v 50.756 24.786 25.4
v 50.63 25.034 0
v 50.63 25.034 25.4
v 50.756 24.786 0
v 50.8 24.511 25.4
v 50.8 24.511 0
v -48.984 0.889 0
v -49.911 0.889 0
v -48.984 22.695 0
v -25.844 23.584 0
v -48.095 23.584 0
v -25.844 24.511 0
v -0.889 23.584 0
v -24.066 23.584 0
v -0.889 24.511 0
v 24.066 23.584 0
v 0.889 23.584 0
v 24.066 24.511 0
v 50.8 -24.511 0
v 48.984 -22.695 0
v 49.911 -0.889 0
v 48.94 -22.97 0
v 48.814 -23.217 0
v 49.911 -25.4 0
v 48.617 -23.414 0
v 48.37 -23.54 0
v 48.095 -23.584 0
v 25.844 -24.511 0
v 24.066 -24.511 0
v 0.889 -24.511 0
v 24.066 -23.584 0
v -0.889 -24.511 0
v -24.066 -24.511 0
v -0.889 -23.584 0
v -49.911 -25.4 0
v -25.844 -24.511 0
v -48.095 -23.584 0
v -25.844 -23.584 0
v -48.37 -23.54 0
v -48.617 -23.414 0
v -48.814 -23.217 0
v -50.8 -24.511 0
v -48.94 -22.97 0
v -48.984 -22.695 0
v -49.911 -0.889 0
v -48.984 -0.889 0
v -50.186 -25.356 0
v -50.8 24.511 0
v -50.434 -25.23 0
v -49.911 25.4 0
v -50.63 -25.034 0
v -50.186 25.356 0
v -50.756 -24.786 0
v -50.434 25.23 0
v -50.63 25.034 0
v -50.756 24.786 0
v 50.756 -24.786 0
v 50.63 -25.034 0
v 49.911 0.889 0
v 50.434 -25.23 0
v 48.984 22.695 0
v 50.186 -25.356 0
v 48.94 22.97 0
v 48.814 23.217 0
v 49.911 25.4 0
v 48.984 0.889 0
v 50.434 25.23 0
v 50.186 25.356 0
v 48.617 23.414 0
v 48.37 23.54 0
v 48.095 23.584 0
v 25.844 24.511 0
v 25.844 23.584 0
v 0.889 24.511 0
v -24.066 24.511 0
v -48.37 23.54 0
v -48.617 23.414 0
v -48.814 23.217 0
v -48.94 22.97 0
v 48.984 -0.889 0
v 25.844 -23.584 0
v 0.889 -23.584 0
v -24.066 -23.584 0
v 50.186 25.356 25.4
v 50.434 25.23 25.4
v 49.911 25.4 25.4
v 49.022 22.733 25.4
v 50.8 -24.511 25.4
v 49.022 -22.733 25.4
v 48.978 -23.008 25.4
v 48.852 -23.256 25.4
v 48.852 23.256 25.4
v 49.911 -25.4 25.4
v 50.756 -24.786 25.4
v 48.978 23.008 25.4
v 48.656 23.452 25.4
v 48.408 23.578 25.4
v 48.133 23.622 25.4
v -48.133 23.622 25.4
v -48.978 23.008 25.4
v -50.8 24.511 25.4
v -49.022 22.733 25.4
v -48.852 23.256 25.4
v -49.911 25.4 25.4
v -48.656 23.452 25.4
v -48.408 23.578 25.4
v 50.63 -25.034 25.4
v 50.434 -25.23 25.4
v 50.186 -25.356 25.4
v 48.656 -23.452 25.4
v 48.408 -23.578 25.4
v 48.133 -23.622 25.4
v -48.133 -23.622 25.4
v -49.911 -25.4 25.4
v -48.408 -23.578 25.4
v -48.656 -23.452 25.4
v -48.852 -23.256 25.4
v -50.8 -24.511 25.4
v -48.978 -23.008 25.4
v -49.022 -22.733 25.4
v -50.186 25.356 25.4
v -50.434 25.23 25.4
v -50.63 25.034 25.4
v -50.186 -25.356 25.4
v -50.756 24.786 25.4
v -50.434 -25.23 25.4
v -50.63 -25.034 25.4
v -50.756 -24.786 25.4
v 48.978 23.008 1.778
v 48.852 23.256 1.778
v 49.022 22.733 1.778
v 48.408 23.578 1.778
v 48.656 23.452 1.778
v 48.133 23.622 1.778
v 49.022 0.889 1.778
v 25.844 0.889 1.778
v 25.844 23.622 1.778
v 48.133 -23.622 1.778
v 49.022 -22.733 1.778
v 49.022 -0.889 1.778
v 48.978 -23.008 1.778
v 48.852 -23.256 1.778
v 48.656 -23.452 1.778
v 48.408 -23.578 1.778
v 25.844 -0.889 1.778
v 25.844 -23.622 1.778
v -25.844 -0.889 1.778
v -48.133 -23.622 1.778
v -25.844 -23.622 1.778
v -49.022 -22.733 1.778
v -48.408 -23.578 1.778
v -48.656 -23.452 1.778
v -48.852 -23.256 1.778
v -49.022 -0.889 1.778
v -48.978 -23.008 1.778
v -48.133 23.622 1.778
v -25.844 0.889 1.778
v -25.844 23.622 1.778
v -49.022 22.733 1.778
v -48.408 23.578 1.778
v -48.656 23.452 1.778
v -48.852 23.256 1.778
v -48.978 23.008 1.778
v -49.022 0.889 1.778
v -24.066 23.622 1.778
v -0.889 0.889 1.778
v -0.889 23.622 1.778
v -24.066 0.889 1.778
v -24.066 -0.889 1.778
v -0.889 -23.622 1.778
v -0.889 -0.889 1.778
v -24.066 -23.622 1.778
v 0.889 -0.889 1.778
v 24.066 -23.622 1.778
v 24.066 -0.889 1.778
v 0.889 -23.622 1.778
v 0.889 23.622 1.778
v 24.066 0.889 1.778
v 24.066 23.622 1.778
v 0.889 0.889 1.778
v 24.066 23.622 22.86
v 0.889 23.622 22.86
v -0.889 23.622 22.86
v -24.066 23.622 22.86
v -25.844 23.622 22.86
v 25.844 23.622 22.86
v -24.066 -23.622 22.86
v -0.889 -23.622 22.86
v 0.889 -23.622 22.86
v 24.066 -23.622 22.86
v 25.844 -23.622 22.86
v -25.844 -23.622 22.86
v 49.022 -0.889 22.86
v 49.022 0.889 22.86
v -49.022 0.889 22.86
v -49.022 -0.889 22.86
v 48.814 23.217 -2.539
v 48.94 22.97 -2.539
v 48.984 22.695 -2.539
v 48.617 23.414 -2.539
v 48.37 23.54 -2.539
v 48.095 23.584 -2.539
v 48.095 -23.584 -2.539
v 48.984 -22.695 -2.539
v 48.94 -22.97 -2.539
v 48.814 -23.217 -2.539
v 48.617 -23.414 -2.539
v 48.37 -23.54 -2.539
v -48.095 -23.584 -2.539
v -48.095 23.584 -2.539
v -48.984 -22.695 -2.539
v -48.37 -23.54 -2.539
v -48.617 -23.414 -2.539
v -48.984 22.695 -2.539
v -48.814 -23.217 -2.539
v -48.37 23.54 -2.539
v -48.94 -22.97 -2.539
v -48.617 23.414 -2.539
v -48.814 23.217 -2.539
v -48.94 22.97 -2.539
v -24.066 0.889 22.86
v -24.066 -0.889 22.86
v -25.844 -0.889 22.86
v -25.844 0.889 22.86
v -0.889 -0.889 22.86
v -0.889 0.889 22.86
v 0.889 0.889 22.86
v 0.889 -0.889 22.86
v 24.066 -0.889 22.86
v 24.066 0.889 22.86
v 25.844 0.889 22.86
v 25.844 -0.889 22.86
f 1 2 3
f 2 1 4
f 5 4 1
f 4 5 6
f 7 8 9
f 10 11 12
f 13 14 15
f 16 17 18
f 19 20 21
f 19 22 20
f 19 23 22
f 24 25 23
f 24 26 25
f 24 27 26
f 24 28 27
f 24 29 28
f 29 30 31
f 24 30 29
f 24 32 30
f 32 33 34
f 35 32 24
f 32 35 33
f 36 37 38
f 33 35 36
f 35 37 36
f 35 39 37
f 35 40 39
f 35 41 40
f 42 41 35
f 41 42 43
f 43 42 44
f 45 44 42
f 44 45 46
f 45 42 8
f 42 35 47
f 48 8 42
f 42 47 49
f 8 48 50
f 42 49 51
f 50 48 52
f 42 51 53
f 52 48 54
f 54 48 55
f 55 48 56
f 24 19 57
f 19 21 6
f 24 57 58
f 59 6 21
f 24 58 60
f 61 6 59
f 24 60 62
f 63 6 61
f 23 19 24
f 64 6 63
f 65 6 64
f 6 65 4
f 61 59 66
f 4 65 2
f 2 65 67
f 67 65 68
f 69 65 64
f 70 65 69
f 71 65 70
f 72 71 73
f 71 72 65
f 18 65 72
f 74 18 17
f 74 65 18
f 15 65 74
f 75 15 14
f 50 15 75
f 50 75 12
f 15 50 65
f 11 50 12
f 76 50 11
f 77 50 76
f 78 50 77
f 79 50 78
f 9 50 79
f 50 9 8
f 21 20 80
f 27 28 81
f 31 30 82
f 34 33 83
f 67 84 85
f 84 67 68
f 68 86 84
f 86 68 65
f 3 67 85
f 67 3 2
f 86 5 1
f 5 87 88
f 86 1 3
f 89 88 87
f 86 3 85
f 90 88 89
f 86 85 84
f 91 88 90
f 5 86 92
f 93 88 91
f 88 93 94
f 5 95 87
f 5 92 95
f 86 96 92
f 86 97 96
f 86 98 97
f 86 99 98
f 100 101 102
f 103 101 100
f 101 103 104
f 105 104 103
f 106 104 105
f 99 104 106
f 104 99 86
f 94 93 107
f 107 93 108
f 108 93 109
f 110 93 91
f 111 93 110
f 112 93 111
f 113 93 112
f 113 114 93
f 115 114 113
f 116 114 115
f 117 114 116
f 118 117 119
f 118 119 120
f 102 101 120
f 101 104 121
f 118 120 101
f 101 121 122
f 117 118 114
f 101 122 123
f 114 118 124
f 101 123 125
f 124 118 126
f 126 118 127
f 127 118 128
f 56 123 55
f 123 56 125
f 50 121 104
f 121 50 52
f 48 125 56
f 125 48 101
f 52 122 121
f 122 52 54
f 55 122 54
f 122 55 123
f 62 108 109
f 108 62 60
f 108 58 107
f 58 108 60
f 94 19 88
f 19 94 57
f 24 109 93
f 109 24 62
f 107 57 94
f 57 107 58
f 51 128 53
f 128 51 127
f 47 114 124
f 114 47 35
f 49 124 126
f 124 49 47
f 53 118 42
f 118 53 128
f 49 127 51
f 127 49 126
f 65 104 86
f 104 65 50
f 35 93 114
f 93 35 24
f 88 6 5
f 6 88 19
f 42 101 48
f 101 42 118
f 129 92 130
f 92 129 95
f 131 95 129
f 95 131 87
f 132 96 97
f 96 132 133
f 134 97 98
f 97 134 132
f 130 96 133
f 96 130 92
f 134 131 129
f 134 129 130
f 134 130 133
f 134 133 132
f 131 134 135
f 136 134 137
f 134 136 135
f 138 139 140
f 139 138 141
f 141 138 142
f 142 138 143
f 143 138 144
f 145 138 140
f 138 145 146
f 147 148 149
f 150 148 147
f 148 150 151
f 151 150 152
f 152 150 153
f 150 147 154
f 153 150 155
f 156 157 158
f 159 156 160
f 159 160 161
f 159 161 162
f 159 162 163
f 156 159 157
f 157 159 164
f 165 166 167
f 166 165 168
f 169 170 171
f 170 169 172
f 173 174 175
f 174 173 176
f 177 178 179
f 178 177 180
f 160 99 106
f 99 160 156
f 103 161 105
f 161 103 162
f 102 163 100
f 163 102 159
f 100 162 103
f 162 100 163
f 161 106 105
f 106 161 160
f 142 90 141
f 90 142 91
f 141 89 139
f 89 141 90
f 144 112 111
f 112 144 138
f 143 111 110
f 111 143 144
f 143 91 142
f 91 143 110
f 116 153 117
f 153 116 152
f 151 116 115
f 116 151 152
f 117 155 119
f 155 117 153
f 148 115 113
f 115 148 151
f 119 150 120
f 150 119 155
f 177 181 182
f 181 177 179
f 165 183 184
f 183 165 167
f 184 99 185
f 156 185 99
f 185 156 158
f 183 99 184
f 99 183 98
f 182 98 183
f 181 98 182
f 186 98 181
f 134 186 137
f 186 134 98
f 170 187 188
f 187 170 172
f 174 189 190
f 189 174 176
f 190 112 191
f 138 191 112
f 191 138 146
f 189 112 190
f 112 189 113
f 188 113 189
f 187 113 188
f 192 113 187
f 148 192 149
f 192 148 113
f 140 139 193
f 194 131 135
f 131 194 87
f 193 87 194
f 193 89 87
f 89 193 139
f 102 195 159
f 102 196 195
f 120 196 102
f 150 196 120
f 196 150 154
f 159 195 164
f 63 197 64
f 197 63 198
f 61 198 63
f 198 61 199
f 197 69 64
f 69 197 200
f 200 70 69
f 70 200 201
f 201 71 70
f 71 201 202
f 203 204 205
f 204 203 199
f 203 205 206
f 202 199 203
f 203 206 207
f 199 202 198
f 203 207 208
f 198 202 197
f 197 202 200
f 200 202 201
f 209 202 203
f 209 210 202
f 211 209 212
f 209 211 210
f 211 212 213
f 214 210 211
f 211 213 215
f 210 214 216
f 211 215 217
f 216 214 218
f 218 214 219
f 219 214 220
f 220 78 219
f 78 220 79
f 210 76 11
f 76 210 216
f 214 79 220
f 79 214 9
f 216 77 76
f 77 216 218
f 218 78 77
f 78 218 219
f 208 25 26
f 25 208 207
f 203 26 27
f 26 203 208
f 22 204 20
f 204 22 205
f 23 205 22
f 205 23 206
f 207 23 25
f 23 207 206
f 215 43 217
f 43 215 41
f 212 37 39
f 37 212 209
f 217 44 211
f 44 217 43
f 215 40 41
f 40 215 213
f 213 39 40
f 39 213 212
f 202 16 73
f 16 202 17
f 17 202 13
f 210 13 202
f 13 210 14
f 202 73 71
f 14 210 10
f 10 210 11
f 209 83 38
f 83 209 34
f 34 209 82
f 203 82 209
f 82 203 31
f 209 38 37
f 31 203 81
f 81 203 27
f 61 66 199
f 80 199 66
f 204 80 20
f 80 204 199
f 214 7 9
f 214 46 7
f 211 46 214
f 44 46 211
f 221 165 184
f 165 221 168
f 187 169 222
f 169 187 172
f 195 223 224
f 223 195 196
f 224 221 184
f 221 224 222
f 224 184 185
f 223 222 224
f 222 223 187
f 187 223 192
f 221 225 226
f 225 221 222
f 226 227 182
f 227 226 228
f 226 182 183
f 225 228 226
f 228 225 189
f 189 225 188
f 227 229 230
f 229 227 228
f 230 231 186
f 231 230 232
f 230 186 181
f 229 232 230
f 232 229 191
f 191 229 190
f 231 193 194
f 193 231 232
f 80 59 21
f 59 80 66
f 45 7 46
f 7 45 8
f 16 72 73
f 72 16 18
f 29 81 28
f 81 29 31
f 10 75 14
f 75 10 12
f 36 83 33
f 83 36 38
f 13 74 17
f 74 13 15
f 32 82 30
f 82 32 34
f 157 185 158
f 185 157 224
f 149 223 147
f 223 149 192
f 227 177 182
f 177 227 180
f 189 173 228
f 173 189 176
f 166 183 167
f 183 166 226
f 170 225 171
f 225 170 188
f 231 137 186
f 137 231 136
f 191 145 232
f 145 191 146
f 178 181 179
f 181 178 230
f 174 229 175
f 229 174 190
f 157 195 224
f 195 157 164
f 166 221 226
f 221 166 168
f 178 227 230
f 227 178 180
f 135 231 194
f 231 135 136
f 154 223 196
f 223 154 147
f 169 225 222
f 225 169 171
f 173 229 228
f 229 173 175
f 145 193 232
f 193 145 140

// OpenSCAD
// Specifies the measurement system and scale you want to use for your trays.  All dimensions below will be in these units.  There are presets called "imperal defaults" and "metric defaults" that make good starting points. 
Scale_Units = 25.4; // [25.4:inch, 10.0:cm]

// Specifies the external tray length in the select unit scale
Tray_Length = 4.0; // [1.0:1.0:10.0]

// Specifies the external tray width in the select unit scale
Tray_Width = 2.0; // [1.0:1.0:10]

// Specifies the external tray height in the select unit scale.  Stackable trays (Interlock Height > 0) will increase the actual height by the height of the interlocking extrusion.
Tray_Height = 1.0; // [0.0:0.25:8]

// Create a lid for your tray.  (See Lid and Interlock Parameters).
Create_A_Lid = false;

// Select a build mode, then use the controls in the same named tabs to specify generation parameters
Build_Mode = "Square_Cups"; // ["Just_the_Tray", "Square_Cups", "Length_Width_Cups", "Length_Width_Cup_Ratios", "Custom_Divisions_per_Column_or_Row", "Custom_Ratio_Divisions", "Tray_Lid"]

/* [Tray Insert Parameters] */

// Size this tray to fit into a bigger tray.  Tray Length and Width is the size of the tray it will fit into. This tray will be just small enough to rest inside the outer tray. The outer tray should have division walls for the insertr tray to rest on, that are sized down appropriately. See "Insert Tray Heighth". Using this will force the Interlock Height to 0
Make_Insert_Tray = false;

// Use this to adapt a larger tray to accespt an smaller insert tray. Set this to be the same height as the height of the insert tray. 
Insert_Tray_Height = 0.0;  // [0.00:0.05:2.00]

// Use this to specify how much free space is between the inner wall of the outer tray and the outer wall of the inner tray. Larger values will create a looser fit.
Insert_Tray_Gap = 0.03;  // [0.00:0.005:2.00]


/* [Square Cups] */
// If not 0, specifies the size of square cups to be create, both tray_length and tray_width should be a multiple of this value.  If your tray is 8x4 and you use a cup size of 1 you will get 32 cups. 
Square_Cup_Size = 1; //[1.0:0.5:10]

/* [Length/Width Cups] */
// This create the specified number of equal length cups along the length of the tray.
Cups_Along_Length = 1; //[1.0:1.0:10]

// This create the specified number of equal width cups across the width of the tray.
Cups_Across_Width = 1; //[1.0:1.0:10]

/* [Length/Width Cup Ratios] */
// This creates cup dividers at the given ratios.  For instance [1,1] makes two equal length divisions, and [1,1,2] makes 2 equal length small divisions and one division that is twice as long.
Lengthwise_Cup_Ratios = [1,1,1,1,1];

// This creates cup dividers at the given ratios.  For instance [1,1] makes two equal width divisions, and [1,1,2] makes 2 equal width small divisions and one divisions that is twice as wide.
Widthwise_Cup_Ratios = [1,1,1,1,1];

/* [Custom Divisions per Column or Row] */
// It is strongly advised that you build this expression in a real text editor, then paste it here.
Custom_Col_Row_Ratios = [1,5,2,2,2,1.5,2,0,3,0,3,0,3,0,2,0,5];

// M2-M3: ["|", 5, 2.5, 2, 3, 3, 3, "*", 3, "*", 3, "*", 3, "*", 2, "*", 5]
// M4:    ["|", 5, 2.5, 2, 3, 3, 3, "*", 4, "*", 4, "*", 3, "*", 2, "*", 5]

/* [Custom Ratio Divisions] */
// It is strongly advised that you build this expression in a real text editor, then paste it here.
Custom_Division_List = [ "-", 0.333, 0.0, 0.666, "-", 0.666, 0.333, 1.0, "|", 0.333, 0.333, 1.0, "|", 0.666, 0.0, 0.666 ];
//[[ "-", 0.66, [0.0, 0.66]],[ "|", 0.66, [0.66, 1.0]]];

/* [Wall Parameters] */
// Specifies how thick the outer wall of the tray will be
Tray_Wall_Thickness = 0.07; // [0.05:0.01:0.50]

// Specifies how thick the floor will be.
Floor_Thickness = 0.07; // [0.05:0.01:0.50]

// Specifies how thick each internal cup divider will be.
Divider_Wall_Thickness = 0.07; // [0.05:0.01:0.50]

// Specifies the "roundess" of tray corners Set to 0 for square corners. Set to 1.0 for the most rounding.  This is a ratio of the wall thickness.
Corner_Roundness = 0.5; // [0.00:0.01:1.00]

/* [Lid Parameters] */
Lid_Handle_Style = "Finger_Holes"; // ["No_Handle", "Finger_Holes", "Block_Handle", "Bar_Handle"]

// How thick should the lid be.  This is the height above the top edge of the tray.  If you want a fully recessed lid, specify 0 here.
Lid_Thickness = 0.07; // [0.00:0.01:0.50]

// Creates a raised edge so a tray can be stacked on top of the lid.
Interlocking_Lid = false;

// Only used when creating a tray too.  Creates a grid on top of the lid that matches the dividers, for labels, of course.
Label_Lid = false;

Number_Of_Finger_Holes = 1; // [1, 2]

Finger_Hole_Style = "Square"; // ["Square", "Round", "Diamond"]

// Normalized length-wise position from the center of the tray to the finger hole(s). 0 will put the hole(s) in the center. 1.0 will center the hole on the outside of the edge.
Finger_Hole_Position = .75; // [0.0:0.01:1.0]

// Make them big enough for your fingers
Finger_Hole_Diameter = 0.7; // [0.5:0.05:2.5]

// The Heght of the handle, above the lid surface.
Block_Handle_Height = 0.375; // [0.25:0.005:1.5]

// The length of the handle
Block_or_Bar_Handle_Length = 1.0; // [0.5:0.25:5.0]

//The width of the block handle, or the diameter of the bar handle.
Block_Width_or_Bar_Diameter = 0.25; // [0.25:0.05:5.0]

// Rotate the handle around the center point of the lid.
Rotate_Handle = 0.0; // [ 0.00 : 45.00 : 180.00]

/* [Interlocking Parameters] */
// Specifies the height of the interlock panel extruded below the tray (and also the distance that the top of the dividers are below the upper tray edge. Specify 0 for non-interlocking stackers. You can still stack them, they just won't interlock.).
Interlock_Height = 0.1; // [0.0:0.01:0.25]

// Specifies how far below the top edge of the tray the top edge of the dividers will be.  Only used when Interlock_Height==0, and intended for use with interlocking lids, recessed lids, or to give a little more recess to insert trays.  When Interlock_Height > 0, it is used instead.
Interlock_Divider_Wall_Recess = 0.0; // [0.0:0.01:0.25]

// Specifies the gap between the interlock extrusion and the inner face of the outer wall of the tray. Largers values will give a looser fit.
Interlock_Gap = 0.003;  // [0.0:0.001:0.020]

// Create scaled versions of all user paramters
scaled_wall_thickness = Scale_Units * Tray_Wall_Thickness;
scaled_floor_thickness = Scale_Units * Floor_Thickness;
scaled_divider_thickness = Scale_Units * Divider_Wall_Thickness;
scaled_Insert_Tray_Gap = Scale_Units * Insert_Tray_Gap;
scaled_tray_length = (Scale_Units * Tray_Length) - (2*((Make_Insert_Tray==true)?scaled_wall_thickness+scaled_Insert_Tray_Gap:0));
scaled_tray_width = (Scale_Units * Tray_Width) - (2*((Make_Insert_Tray==true)?scaled_wall_thickness+scaled_Insert_Tray_Gap:0));
scaled_tray_height = Scale_Units * Tray_Height;

scaled_corner_radius = Scale_Units * Corner_Roundness * Tray_Wall_Thickness; 
scaled_interlock_gap = Scale_Units * Interlock_Gap;
scaled_interlock_height = (Make_Insert_Tray==true)?0:(Scale_Units * Interlock_Height);
scaled_Interlock_Divider_Wall_Recess = Scale_Units * ((scaled_interlock_height==0)?Interlock_Divider_Wall_Recess:Interlock_Height);
scaled_lid_thickness = Scale_Units * Lid_Thickness;
scaled_Finger_Hole_Position = Scale_Units * Finger_Hole_Position;
scaled_finger_hole_diameter = Scale_Units * Finger_Hole_Diameter;
scaled_block_handle_length = Scale_Units * Block_or_Bar_Handle_Length;
scaled_block_handle_width = Scale_Units * Block_Width_or_Bar_Diameter;
scaled_block_handle_height = Scale_Units * Block_Handle_Height;
scaled_insert_tray_height = Scale_Units * Insert_Tray_Height;
scaled_divider_height = scaled_tray_height-scaled_Interlock_Divider_Wall_Recess-scaled_insert_tray_height;

// Scale the wall height down to allow for inserting a smaller tray if desired
Divider_Wall_Height_Scale = 1.0;  // [0.05:0.01:1.00]

// A function to add up the elements of an vector.
function add_vect(v, i = 0, r = 0) = i < len(v) ? add_vect(v, i + 1, r + v[i]) : r;

// Extract all elements starting at 'start' into a new vector
function sub_vect(vect, start) = [for( i = [start : 1 : len(vect)-1]) vect[i] ];

// Reverse the elements in a vector, returning a new vector, of course
function rev_vect(vect) = [for( i = [len(vect)-1 : -1 : 0]) vect[i] ];

// Convert a list of ratios into a list of normalized division.
function make_normalized_divs(ratios) = (
    let (total = add_vect(ratios))
    let (mult = 1.0/total)
    let (divs = [ for(i=ratios) (i*mult) ])
    [ for(i=[len(divs)-1:-1:1]) add_vect(divs, i, 0)]
);

module mkshell (length, width, height, wall, radius, offset=0, offset2=0) {
    // length => length of the shell
    // width => width of the shell
    // height => height of the shell
    // radius => corner radius (corresponds to wall thickness)
    
    // offset => shrinks the resulting shell by this amount in
    // both length and width (but not height).  This param is used 
    // to build the inner-cavity that is subtracted from the outer
    // shell in order to create the tray.
    
    // offset2 => used when building the "bottom" tray that is 
    // subrated from the top tray to create the stacking inter-
    // lock.  It expands the outer wall (to ensure overlap) and
    // shrinks the inner wall (to ensure a tight, but not too
    // tight, fit between the trays.
    
    l = length - offset;
    w = width - offset;
    h = height;
    
    
    cube([l-((radius+offset2/2)*2),w-offset2,h], center=true); 
    cube([l-offset2,w-((radius+offset2/2)*2),h], center=true); 
    if (radius > 0) {
        // Create the rounded corners
        translate([l/2-radius-offset2/2, w/2-radius-offset2/2, 0]) {
          cylinder(h, r=radius, center=true, $fn=20);
        }
        translate([-l/2+radius+offset2/2, w/2-radius-offset2/2, 0]) {
          cylinder(h, r=radius, center=true, $fn=20);
        }
        translate([l/2-radius-offset2/2, -w/2+radius+offset2/2, 0]) {
          cylinder(h, r=radius, center=true, $fn=20);
        }
        translate([-l/2+radius+offset2/2, -w/2+radius+offset2/2, 0]) {
          cylinder(h, r=radius, center=true, $fn=20);
        }
    }
}


/*
    Someday it might be nice to combine the make_l_div() and make_w_div modules into
    a single module so I don't have to duplicate code between then.  But for now
    these work without having to conditionally figure out the geometries.
 */
module make_l_div(pos, height, from=0, to=1.0, hscale=1.0) {
    // pos is a normalized position, from 0.0 to 1.0
    // from is a normalized start point, default 0.0 is one wall
    // end is a normalized end point, default 1.0 is the other wall
    // hscale can be used to scale the height of the division wall
    wid = scaled_tray_width-(scaled_divider_thickness);
    wpos = (wid*pos) - (wid/2);
    _length = (scaled_tray_length - scaled_wall_thickness);
    lstart = (_length*from) - (_length/2);
    lend = (_length*to) - (_length/2);
    llen = (lend - lstart); 
    hdiv = (height) * hscale;
    union() {
        translate([lstart+(llen/2),wpos,hdiv/2]) {
            cube([llen,scaled_divider_thickness,hdiv], center=true);
        }
        if (from > 0.0) {
            translate([lstart,wpos,hdiv/2]) {
                cylinder(hdiv, r=scaled_divider_thickness/2, center=true, $fn=20);
            }
        }
        if (to < 1.0) {
            translate([lend,wpos,hdiv/2]) {
                cylinder(hdiv, r=scaled_divider_thickness/2, center=true, $fn=20);
            }
        }
    }
}

module make_w_div(pos, height, from=0, to=1.0, hscale=1.0) {
    // pos is a normalized position, from 0.0 to 1.0
    // from is a normalized start point, default 0.0 is one wall
    // end is a normalized end point, default 1.0 is the other wall
    // hscale can be used to scale the height of the division wall
    llen = scaled_tray_length-scaled_divider_thickness;
    lpos = (llen*pos) - (llen/2);
    _length = scaled_tray_width - scaled_wall_thickness;
    wstart = (_length*from) - (_length/2);
    wend = (_length*to) - (_length/2);
    wlen = (wend-wstart);
    hdiv = (height) * hscale;
    union() {
        translate([lpos,wstart+(wlen/2),hdiv/2]) {
            cube([scaled_divider_thickness,wlen, hdiv], center=true);
        }
        if (from > 0.0) {
            translate([lpos,wstart,hdiv/2]) {
                cylinder(hdiv, r=scaled_divider_thickness/2, center=true, $fn=20);
            }
        }
        if (to < 1.0) {
            translate([lpos,wend,hdiv/2]) {
                cylinder(hdiv, r=scaled_divider_thickness/2, center=true, $fn=20);
            }
        }
    }
}

module make_div(dir, pos, height, from=0, to=1.0, hscale=1.0) {
    if (dir == 0 || dir == "-" || dir == "length") {
        make_l_div(pos, height, from, to, hscale);
    }
    if (dir == 1 || dir == "|" || dir == "width") {
        make_w_div(pos, height, from, to, hscale);
    }
}

module make_lid() {
    difference() {
        union() {
            label_div_offset = (Label_Lid == true)?0.2:0.0;
            // Create the part of the lid above the tray edge.
            if (scaled_lid_thickness > 0) {
                translate([0,0,scaled_lid_thickness/2]) {
                    mkshell(scaled_tray_length, scaled_tray_width, scaled_lid_thickness, scaled_wall_thickness, scaled_corner_radius); 
                };
            }
            if (scaled_interlock_height > 0) {
                // Create the part of the lid recessed below the tray edge.
                translate([0,0, -scaled_interlock_height/2+0.001]) {
                    mkshell(scaled_tray_length, scaled_tray_width, scaled_interlock_height, 
                    scaled_wall_thickness, scaled_corner_radius, scaled_wall_thickness*2, scaled_interlock_gap);
                }
            }
            if (Interlocking_Lid == true && scaled_lid_thickness > 0) {
                // Create a raised edge so a tray placed on top of this tray will stack interlocked.
                translate([0,0,(scaled_lid_thickness+scaled_interlock_height/2)-0.001]) {
                    difference() {
                        mkshell(scaled_tray_length, scaled_tray_width, scaled_interlock_height+label_div_offset+0.001, scaled_wall_thickness, scaled_corner_radius); 
                        mkshell(scaled_tray_length, scaled_tray_width, scaled_interlock_height+label_div_offset+0.1, 
                        scaled_wall_thickness, scaled_corner_radius, scaled_wall_thickness*2, scaled_interlock_gap);
                    }
                }
            }
            if (Label_Lid == true) {
                translate([0,0,scaled_lid_thickness-0.001]) {
                    make_tray_cups(label_div_offset);
                }
            }

            // Create additive handles, if specified.
            rotate([0,0,Rotate_Handle]) {
                if (Lid_Handle_Style == "Block_Handle") {
                    translate([0,0, scaled_lid_thickness+scaled_block_handle_height/2 - 0.001]) {
                        cube([scaled_block_handle_length, scaled_block_handle_width, scaled_block_handle_height], center=true);
                    }
                }
                if (Lid_Handle_Style == "Bar_Handle") {
                    translate([0,0, (scaled_lid_thickness + scaled_block_handle_width)/2]) {
                        rotate([0,90,0]) {
                            cylinder(scaled_block_handle_length, r=scaled_block_handle_width/2, center=true);
                        }
                    }
                }
            }
        }
        // Create subtractive handles, if specified.
        if (Lid_Handle_Style == "Finger_Holes") {
            rotate([0,0,Rotate_Handle]) {
                height = scaled_lid_thickness+scaled_interlock_height*4;
                hole_offset = scaled_tray_length/2 * Finger_Hole_Position;
                translate ([hole_offset, 0, 0]) {
                    if (Finger_Hole_Style == "Round") {
                        cylinder(height, r=scaled_finger_hole_diameter/2, center=true);
                    }
                    if (Finger_Hole_Style == "Square") {
                        cube([scaled_finger_hole_diameter, scaled_finger_hole_diameter, height], center=true);
                    }
                    if (Finger_Hole_Style == "Diamond") {
                        rotate([0,0,45]) {
                            cube([scaled_finger_hole_diameter, scaled_finger_hole_diameter, height], center=true);
                        }
                    }
                }
                if (Number_Of_Finger_Holes == 2) {
                    translate ([-hole_offset, 0, 0]) {
                        if (Finger_Hole_Style == "Round") {
                            cylinder(height, r=scaled_finger_hole_diameter/2, center=true);
                        }
                        if (Finger_Hole_Style == "Square") {
                            cube([scaled_finger_hole_diameter, scaled_finger_hole_diameter, height], center=true);
                        }
                        if (Finger_Hole_Style == "Diamond") {
                            rotate([0,0,45]) {
                                cube([scaled_finger_hole_diameter, scaled_finger_hole_diameter, height], center=true);
                            }
                        }
                    }
                }
            }
        }
    }
}

module make_tray() {
    union() {
        translate([0,0,scaled_tray_height/2]) {
            difference() {
                // Main outer shell
                mkshell(scaled_tray_length, scaled_tray_width, scaled_tray_height, scaled_wall_thickness, scaled_corner_radius); 
                translate([0,0,scaled_floor_thickness]) {
                    // Subtract inner space..
                    mkshell(scaled_tray_length, scaled_tray_width, scaled_tray_height, 
                        scaled_wall_thickness, scaled_corner_radius, scaled_wall_thickness*2);
                }
            };
        };
        // Make the bottom extrusion that allows this tray to interlock with a tray below for secure stacking.
        if (scaled_interlock_height > 0) {
            translate([0,0, -scaled_interlock_height/2+0.001]) {
                mkshell(scaled_tray_length, scaled_tray_width, scaled_interlock_height, 
                scaled_wall_thickness, scaled_corner_radius, scaled_wall_thickness*2, scaled_interlock_gap);
            }
        }
    }
}

module make_dividers(divs, height, orient="length", from=0, to=1.0, hscale=1.0) {
    // divs is a normalized array of 
    // positions for each divider to create.
    for ( i = divs ){
        make_div(orient, i, height, from, to, hscale);
    }
}

module make_equal_cups(num_divs, height, orient="length", from=0.0, to=1.0) {
    increment = 1.0/num_divs;
    for ( i = [increment : increment : (1.0-increment)] ){
        make_div(orient, i, height, from, hscale=Divider_Wall_Height_Scale);
    }
}

module make_cups(ratios, height, orient="length", from=0.0, to=1.0, hscale=1.0) {
    divs2 = make_normalized_divs(ratios);
    make_dividers(divs2, height, orient, from, to, hscale);
}

module make_walls(section, mode, walls, height, divisions) {
    echo(section, mode, walls)
    if (section < len(divisions)-1) {
        from = divisions[section];
        to = divisions[section+1];
            if (len(walls) > 2 && walls[2] > 0) {
                ratios = rev_vect([ for( i = [1 : 1 : walls[1]]) walls[1+i] ]);
                make_cups(ratios, height, mode, from, to, hscale=Divider_Wall_Height_Scale);
                wall_specs = sub_vect(walls, 2 + walls[1]); 
                make_walls(section+1, mode, wall_specs, height, divisions);
            }
            else {
                ratios = rev_vect([ for( i = [1 : 1 : walls[1]]) 1 ]);
                make_cups(ratios, height, mode, from, to, hscale=Divider_Wall_Height_Scale);
                wall_specs = sub_vect(walls, 2); 
                make_walls(section+1, mode, wall_specs, height, divisions);
            }
    }
}

module make_custom_div(div_list, height) {
    if (len(div_list) > 3) {
        dir = div_list[0];
        pos = div_list[1];
        from = div_list[2];
        to = div_list[3];
        make_div(dir, pos, height, from, to, hscale=Divider_Wall_Height_Scale);
        next_list = sub_vect(div_list, 4);
        make_custom_div(next_list, height);
    }
}

module make_equal_cup_dividers(height) {
    make_equal_cups(Tray_Length/Square_Cup_Size, height, "width");
    make_equal_cups(Tray_Width/Square_Cup_Size, height, "length");
}

module make_lw_cups(height) {
    make_equal_cups(Cups_Along_Length, height, "width");
    make_equal_cups(Cups_Across_Width, height, "length");
}

module make_lw_cup_ratios(height) {
    make_cups(Lengthwise_Cup_Ratios, height, "width", hscale=Divider_Wall_Height_Scale);
    make_cups(Widthwise_Cup_Ratios, height, "length", hscale=Divider_Wall_Height_Scale);
}

module make_custom_div_ratios(height) {
    mode = Custom_Col_Row_Ratios[0];
    other_mode = (mode == 1)?0:1;
    divs = Custom_Col_Row_Ratios[1];
    if (Custom_Col_Row_Ratios[2] > 0) {
        ratios = rev_vect([ for( i = [0 : 1 : divs-1]) Custom_Col_Row_Ratios[2+i] ]);
        make_cups(ratios, height, mode, hscale=Divider_Wall_Height_Scale);
        divisions = concat( [0.0], make_normalized_divs(ratios), [1.0]);
        start = 2 + divs;
        wall_specs = sub_vect(Custom_Col_Row_Ratios, start);
        make_walls(0, other_mode, wall_specs, height, divisions);
    }
    else {
        make_equal_cups(divs, height, mode, hscale=Divider_Wall_Height_Scale);
        divisions = concat( [0.0], make_normalized_divs([ for( i = [0 : 1 : divs-1]) 1 ]), [1.0]);
        wall_specs = sub_vect(Custom_Col_Row_Ratios, 2);
        make_walls(0, other_mode, wall_specs, height, divisions);
    }
}

module make_tray_cups(height) {
    if (Build_Mode == "Square_Cups") {
        make_equal_cup_dividers(height);
    }

    if (Build_Mode == "Length_Width_Cups") {
        make_lw_cups(height);
    }

    if (Build_Mode == "Length_Width_Cup_Ratios") {
        make_lw_cup_ratios(height);
    }

    if (Build_Mode == "Custom_Divisions_per_Column_or_Row") {
        make_custom_div_ratios(height);
    }

    if (Build_Mode == "Custom_Ratio_Divisions") {
        make_custom_div(Custom_Division_List, height);
    }
}

echo(Build_Mode)
if (Build_Mode == "Just_the_Tray") {
    make_tray();
}
else if (Build_Mode == "Tray_Lid") {
    make_lid();
}
else {
    union() {
        make_tray();
        make_tray_cups(scaled_divider_height);
    }
}

if (Build_Mode != "Tray_Lid" && Create_A_Lid == true) {
    translate([0, (scaled_tray_width + Scale_Units), 0]) {
        make_lid();
    }
}
